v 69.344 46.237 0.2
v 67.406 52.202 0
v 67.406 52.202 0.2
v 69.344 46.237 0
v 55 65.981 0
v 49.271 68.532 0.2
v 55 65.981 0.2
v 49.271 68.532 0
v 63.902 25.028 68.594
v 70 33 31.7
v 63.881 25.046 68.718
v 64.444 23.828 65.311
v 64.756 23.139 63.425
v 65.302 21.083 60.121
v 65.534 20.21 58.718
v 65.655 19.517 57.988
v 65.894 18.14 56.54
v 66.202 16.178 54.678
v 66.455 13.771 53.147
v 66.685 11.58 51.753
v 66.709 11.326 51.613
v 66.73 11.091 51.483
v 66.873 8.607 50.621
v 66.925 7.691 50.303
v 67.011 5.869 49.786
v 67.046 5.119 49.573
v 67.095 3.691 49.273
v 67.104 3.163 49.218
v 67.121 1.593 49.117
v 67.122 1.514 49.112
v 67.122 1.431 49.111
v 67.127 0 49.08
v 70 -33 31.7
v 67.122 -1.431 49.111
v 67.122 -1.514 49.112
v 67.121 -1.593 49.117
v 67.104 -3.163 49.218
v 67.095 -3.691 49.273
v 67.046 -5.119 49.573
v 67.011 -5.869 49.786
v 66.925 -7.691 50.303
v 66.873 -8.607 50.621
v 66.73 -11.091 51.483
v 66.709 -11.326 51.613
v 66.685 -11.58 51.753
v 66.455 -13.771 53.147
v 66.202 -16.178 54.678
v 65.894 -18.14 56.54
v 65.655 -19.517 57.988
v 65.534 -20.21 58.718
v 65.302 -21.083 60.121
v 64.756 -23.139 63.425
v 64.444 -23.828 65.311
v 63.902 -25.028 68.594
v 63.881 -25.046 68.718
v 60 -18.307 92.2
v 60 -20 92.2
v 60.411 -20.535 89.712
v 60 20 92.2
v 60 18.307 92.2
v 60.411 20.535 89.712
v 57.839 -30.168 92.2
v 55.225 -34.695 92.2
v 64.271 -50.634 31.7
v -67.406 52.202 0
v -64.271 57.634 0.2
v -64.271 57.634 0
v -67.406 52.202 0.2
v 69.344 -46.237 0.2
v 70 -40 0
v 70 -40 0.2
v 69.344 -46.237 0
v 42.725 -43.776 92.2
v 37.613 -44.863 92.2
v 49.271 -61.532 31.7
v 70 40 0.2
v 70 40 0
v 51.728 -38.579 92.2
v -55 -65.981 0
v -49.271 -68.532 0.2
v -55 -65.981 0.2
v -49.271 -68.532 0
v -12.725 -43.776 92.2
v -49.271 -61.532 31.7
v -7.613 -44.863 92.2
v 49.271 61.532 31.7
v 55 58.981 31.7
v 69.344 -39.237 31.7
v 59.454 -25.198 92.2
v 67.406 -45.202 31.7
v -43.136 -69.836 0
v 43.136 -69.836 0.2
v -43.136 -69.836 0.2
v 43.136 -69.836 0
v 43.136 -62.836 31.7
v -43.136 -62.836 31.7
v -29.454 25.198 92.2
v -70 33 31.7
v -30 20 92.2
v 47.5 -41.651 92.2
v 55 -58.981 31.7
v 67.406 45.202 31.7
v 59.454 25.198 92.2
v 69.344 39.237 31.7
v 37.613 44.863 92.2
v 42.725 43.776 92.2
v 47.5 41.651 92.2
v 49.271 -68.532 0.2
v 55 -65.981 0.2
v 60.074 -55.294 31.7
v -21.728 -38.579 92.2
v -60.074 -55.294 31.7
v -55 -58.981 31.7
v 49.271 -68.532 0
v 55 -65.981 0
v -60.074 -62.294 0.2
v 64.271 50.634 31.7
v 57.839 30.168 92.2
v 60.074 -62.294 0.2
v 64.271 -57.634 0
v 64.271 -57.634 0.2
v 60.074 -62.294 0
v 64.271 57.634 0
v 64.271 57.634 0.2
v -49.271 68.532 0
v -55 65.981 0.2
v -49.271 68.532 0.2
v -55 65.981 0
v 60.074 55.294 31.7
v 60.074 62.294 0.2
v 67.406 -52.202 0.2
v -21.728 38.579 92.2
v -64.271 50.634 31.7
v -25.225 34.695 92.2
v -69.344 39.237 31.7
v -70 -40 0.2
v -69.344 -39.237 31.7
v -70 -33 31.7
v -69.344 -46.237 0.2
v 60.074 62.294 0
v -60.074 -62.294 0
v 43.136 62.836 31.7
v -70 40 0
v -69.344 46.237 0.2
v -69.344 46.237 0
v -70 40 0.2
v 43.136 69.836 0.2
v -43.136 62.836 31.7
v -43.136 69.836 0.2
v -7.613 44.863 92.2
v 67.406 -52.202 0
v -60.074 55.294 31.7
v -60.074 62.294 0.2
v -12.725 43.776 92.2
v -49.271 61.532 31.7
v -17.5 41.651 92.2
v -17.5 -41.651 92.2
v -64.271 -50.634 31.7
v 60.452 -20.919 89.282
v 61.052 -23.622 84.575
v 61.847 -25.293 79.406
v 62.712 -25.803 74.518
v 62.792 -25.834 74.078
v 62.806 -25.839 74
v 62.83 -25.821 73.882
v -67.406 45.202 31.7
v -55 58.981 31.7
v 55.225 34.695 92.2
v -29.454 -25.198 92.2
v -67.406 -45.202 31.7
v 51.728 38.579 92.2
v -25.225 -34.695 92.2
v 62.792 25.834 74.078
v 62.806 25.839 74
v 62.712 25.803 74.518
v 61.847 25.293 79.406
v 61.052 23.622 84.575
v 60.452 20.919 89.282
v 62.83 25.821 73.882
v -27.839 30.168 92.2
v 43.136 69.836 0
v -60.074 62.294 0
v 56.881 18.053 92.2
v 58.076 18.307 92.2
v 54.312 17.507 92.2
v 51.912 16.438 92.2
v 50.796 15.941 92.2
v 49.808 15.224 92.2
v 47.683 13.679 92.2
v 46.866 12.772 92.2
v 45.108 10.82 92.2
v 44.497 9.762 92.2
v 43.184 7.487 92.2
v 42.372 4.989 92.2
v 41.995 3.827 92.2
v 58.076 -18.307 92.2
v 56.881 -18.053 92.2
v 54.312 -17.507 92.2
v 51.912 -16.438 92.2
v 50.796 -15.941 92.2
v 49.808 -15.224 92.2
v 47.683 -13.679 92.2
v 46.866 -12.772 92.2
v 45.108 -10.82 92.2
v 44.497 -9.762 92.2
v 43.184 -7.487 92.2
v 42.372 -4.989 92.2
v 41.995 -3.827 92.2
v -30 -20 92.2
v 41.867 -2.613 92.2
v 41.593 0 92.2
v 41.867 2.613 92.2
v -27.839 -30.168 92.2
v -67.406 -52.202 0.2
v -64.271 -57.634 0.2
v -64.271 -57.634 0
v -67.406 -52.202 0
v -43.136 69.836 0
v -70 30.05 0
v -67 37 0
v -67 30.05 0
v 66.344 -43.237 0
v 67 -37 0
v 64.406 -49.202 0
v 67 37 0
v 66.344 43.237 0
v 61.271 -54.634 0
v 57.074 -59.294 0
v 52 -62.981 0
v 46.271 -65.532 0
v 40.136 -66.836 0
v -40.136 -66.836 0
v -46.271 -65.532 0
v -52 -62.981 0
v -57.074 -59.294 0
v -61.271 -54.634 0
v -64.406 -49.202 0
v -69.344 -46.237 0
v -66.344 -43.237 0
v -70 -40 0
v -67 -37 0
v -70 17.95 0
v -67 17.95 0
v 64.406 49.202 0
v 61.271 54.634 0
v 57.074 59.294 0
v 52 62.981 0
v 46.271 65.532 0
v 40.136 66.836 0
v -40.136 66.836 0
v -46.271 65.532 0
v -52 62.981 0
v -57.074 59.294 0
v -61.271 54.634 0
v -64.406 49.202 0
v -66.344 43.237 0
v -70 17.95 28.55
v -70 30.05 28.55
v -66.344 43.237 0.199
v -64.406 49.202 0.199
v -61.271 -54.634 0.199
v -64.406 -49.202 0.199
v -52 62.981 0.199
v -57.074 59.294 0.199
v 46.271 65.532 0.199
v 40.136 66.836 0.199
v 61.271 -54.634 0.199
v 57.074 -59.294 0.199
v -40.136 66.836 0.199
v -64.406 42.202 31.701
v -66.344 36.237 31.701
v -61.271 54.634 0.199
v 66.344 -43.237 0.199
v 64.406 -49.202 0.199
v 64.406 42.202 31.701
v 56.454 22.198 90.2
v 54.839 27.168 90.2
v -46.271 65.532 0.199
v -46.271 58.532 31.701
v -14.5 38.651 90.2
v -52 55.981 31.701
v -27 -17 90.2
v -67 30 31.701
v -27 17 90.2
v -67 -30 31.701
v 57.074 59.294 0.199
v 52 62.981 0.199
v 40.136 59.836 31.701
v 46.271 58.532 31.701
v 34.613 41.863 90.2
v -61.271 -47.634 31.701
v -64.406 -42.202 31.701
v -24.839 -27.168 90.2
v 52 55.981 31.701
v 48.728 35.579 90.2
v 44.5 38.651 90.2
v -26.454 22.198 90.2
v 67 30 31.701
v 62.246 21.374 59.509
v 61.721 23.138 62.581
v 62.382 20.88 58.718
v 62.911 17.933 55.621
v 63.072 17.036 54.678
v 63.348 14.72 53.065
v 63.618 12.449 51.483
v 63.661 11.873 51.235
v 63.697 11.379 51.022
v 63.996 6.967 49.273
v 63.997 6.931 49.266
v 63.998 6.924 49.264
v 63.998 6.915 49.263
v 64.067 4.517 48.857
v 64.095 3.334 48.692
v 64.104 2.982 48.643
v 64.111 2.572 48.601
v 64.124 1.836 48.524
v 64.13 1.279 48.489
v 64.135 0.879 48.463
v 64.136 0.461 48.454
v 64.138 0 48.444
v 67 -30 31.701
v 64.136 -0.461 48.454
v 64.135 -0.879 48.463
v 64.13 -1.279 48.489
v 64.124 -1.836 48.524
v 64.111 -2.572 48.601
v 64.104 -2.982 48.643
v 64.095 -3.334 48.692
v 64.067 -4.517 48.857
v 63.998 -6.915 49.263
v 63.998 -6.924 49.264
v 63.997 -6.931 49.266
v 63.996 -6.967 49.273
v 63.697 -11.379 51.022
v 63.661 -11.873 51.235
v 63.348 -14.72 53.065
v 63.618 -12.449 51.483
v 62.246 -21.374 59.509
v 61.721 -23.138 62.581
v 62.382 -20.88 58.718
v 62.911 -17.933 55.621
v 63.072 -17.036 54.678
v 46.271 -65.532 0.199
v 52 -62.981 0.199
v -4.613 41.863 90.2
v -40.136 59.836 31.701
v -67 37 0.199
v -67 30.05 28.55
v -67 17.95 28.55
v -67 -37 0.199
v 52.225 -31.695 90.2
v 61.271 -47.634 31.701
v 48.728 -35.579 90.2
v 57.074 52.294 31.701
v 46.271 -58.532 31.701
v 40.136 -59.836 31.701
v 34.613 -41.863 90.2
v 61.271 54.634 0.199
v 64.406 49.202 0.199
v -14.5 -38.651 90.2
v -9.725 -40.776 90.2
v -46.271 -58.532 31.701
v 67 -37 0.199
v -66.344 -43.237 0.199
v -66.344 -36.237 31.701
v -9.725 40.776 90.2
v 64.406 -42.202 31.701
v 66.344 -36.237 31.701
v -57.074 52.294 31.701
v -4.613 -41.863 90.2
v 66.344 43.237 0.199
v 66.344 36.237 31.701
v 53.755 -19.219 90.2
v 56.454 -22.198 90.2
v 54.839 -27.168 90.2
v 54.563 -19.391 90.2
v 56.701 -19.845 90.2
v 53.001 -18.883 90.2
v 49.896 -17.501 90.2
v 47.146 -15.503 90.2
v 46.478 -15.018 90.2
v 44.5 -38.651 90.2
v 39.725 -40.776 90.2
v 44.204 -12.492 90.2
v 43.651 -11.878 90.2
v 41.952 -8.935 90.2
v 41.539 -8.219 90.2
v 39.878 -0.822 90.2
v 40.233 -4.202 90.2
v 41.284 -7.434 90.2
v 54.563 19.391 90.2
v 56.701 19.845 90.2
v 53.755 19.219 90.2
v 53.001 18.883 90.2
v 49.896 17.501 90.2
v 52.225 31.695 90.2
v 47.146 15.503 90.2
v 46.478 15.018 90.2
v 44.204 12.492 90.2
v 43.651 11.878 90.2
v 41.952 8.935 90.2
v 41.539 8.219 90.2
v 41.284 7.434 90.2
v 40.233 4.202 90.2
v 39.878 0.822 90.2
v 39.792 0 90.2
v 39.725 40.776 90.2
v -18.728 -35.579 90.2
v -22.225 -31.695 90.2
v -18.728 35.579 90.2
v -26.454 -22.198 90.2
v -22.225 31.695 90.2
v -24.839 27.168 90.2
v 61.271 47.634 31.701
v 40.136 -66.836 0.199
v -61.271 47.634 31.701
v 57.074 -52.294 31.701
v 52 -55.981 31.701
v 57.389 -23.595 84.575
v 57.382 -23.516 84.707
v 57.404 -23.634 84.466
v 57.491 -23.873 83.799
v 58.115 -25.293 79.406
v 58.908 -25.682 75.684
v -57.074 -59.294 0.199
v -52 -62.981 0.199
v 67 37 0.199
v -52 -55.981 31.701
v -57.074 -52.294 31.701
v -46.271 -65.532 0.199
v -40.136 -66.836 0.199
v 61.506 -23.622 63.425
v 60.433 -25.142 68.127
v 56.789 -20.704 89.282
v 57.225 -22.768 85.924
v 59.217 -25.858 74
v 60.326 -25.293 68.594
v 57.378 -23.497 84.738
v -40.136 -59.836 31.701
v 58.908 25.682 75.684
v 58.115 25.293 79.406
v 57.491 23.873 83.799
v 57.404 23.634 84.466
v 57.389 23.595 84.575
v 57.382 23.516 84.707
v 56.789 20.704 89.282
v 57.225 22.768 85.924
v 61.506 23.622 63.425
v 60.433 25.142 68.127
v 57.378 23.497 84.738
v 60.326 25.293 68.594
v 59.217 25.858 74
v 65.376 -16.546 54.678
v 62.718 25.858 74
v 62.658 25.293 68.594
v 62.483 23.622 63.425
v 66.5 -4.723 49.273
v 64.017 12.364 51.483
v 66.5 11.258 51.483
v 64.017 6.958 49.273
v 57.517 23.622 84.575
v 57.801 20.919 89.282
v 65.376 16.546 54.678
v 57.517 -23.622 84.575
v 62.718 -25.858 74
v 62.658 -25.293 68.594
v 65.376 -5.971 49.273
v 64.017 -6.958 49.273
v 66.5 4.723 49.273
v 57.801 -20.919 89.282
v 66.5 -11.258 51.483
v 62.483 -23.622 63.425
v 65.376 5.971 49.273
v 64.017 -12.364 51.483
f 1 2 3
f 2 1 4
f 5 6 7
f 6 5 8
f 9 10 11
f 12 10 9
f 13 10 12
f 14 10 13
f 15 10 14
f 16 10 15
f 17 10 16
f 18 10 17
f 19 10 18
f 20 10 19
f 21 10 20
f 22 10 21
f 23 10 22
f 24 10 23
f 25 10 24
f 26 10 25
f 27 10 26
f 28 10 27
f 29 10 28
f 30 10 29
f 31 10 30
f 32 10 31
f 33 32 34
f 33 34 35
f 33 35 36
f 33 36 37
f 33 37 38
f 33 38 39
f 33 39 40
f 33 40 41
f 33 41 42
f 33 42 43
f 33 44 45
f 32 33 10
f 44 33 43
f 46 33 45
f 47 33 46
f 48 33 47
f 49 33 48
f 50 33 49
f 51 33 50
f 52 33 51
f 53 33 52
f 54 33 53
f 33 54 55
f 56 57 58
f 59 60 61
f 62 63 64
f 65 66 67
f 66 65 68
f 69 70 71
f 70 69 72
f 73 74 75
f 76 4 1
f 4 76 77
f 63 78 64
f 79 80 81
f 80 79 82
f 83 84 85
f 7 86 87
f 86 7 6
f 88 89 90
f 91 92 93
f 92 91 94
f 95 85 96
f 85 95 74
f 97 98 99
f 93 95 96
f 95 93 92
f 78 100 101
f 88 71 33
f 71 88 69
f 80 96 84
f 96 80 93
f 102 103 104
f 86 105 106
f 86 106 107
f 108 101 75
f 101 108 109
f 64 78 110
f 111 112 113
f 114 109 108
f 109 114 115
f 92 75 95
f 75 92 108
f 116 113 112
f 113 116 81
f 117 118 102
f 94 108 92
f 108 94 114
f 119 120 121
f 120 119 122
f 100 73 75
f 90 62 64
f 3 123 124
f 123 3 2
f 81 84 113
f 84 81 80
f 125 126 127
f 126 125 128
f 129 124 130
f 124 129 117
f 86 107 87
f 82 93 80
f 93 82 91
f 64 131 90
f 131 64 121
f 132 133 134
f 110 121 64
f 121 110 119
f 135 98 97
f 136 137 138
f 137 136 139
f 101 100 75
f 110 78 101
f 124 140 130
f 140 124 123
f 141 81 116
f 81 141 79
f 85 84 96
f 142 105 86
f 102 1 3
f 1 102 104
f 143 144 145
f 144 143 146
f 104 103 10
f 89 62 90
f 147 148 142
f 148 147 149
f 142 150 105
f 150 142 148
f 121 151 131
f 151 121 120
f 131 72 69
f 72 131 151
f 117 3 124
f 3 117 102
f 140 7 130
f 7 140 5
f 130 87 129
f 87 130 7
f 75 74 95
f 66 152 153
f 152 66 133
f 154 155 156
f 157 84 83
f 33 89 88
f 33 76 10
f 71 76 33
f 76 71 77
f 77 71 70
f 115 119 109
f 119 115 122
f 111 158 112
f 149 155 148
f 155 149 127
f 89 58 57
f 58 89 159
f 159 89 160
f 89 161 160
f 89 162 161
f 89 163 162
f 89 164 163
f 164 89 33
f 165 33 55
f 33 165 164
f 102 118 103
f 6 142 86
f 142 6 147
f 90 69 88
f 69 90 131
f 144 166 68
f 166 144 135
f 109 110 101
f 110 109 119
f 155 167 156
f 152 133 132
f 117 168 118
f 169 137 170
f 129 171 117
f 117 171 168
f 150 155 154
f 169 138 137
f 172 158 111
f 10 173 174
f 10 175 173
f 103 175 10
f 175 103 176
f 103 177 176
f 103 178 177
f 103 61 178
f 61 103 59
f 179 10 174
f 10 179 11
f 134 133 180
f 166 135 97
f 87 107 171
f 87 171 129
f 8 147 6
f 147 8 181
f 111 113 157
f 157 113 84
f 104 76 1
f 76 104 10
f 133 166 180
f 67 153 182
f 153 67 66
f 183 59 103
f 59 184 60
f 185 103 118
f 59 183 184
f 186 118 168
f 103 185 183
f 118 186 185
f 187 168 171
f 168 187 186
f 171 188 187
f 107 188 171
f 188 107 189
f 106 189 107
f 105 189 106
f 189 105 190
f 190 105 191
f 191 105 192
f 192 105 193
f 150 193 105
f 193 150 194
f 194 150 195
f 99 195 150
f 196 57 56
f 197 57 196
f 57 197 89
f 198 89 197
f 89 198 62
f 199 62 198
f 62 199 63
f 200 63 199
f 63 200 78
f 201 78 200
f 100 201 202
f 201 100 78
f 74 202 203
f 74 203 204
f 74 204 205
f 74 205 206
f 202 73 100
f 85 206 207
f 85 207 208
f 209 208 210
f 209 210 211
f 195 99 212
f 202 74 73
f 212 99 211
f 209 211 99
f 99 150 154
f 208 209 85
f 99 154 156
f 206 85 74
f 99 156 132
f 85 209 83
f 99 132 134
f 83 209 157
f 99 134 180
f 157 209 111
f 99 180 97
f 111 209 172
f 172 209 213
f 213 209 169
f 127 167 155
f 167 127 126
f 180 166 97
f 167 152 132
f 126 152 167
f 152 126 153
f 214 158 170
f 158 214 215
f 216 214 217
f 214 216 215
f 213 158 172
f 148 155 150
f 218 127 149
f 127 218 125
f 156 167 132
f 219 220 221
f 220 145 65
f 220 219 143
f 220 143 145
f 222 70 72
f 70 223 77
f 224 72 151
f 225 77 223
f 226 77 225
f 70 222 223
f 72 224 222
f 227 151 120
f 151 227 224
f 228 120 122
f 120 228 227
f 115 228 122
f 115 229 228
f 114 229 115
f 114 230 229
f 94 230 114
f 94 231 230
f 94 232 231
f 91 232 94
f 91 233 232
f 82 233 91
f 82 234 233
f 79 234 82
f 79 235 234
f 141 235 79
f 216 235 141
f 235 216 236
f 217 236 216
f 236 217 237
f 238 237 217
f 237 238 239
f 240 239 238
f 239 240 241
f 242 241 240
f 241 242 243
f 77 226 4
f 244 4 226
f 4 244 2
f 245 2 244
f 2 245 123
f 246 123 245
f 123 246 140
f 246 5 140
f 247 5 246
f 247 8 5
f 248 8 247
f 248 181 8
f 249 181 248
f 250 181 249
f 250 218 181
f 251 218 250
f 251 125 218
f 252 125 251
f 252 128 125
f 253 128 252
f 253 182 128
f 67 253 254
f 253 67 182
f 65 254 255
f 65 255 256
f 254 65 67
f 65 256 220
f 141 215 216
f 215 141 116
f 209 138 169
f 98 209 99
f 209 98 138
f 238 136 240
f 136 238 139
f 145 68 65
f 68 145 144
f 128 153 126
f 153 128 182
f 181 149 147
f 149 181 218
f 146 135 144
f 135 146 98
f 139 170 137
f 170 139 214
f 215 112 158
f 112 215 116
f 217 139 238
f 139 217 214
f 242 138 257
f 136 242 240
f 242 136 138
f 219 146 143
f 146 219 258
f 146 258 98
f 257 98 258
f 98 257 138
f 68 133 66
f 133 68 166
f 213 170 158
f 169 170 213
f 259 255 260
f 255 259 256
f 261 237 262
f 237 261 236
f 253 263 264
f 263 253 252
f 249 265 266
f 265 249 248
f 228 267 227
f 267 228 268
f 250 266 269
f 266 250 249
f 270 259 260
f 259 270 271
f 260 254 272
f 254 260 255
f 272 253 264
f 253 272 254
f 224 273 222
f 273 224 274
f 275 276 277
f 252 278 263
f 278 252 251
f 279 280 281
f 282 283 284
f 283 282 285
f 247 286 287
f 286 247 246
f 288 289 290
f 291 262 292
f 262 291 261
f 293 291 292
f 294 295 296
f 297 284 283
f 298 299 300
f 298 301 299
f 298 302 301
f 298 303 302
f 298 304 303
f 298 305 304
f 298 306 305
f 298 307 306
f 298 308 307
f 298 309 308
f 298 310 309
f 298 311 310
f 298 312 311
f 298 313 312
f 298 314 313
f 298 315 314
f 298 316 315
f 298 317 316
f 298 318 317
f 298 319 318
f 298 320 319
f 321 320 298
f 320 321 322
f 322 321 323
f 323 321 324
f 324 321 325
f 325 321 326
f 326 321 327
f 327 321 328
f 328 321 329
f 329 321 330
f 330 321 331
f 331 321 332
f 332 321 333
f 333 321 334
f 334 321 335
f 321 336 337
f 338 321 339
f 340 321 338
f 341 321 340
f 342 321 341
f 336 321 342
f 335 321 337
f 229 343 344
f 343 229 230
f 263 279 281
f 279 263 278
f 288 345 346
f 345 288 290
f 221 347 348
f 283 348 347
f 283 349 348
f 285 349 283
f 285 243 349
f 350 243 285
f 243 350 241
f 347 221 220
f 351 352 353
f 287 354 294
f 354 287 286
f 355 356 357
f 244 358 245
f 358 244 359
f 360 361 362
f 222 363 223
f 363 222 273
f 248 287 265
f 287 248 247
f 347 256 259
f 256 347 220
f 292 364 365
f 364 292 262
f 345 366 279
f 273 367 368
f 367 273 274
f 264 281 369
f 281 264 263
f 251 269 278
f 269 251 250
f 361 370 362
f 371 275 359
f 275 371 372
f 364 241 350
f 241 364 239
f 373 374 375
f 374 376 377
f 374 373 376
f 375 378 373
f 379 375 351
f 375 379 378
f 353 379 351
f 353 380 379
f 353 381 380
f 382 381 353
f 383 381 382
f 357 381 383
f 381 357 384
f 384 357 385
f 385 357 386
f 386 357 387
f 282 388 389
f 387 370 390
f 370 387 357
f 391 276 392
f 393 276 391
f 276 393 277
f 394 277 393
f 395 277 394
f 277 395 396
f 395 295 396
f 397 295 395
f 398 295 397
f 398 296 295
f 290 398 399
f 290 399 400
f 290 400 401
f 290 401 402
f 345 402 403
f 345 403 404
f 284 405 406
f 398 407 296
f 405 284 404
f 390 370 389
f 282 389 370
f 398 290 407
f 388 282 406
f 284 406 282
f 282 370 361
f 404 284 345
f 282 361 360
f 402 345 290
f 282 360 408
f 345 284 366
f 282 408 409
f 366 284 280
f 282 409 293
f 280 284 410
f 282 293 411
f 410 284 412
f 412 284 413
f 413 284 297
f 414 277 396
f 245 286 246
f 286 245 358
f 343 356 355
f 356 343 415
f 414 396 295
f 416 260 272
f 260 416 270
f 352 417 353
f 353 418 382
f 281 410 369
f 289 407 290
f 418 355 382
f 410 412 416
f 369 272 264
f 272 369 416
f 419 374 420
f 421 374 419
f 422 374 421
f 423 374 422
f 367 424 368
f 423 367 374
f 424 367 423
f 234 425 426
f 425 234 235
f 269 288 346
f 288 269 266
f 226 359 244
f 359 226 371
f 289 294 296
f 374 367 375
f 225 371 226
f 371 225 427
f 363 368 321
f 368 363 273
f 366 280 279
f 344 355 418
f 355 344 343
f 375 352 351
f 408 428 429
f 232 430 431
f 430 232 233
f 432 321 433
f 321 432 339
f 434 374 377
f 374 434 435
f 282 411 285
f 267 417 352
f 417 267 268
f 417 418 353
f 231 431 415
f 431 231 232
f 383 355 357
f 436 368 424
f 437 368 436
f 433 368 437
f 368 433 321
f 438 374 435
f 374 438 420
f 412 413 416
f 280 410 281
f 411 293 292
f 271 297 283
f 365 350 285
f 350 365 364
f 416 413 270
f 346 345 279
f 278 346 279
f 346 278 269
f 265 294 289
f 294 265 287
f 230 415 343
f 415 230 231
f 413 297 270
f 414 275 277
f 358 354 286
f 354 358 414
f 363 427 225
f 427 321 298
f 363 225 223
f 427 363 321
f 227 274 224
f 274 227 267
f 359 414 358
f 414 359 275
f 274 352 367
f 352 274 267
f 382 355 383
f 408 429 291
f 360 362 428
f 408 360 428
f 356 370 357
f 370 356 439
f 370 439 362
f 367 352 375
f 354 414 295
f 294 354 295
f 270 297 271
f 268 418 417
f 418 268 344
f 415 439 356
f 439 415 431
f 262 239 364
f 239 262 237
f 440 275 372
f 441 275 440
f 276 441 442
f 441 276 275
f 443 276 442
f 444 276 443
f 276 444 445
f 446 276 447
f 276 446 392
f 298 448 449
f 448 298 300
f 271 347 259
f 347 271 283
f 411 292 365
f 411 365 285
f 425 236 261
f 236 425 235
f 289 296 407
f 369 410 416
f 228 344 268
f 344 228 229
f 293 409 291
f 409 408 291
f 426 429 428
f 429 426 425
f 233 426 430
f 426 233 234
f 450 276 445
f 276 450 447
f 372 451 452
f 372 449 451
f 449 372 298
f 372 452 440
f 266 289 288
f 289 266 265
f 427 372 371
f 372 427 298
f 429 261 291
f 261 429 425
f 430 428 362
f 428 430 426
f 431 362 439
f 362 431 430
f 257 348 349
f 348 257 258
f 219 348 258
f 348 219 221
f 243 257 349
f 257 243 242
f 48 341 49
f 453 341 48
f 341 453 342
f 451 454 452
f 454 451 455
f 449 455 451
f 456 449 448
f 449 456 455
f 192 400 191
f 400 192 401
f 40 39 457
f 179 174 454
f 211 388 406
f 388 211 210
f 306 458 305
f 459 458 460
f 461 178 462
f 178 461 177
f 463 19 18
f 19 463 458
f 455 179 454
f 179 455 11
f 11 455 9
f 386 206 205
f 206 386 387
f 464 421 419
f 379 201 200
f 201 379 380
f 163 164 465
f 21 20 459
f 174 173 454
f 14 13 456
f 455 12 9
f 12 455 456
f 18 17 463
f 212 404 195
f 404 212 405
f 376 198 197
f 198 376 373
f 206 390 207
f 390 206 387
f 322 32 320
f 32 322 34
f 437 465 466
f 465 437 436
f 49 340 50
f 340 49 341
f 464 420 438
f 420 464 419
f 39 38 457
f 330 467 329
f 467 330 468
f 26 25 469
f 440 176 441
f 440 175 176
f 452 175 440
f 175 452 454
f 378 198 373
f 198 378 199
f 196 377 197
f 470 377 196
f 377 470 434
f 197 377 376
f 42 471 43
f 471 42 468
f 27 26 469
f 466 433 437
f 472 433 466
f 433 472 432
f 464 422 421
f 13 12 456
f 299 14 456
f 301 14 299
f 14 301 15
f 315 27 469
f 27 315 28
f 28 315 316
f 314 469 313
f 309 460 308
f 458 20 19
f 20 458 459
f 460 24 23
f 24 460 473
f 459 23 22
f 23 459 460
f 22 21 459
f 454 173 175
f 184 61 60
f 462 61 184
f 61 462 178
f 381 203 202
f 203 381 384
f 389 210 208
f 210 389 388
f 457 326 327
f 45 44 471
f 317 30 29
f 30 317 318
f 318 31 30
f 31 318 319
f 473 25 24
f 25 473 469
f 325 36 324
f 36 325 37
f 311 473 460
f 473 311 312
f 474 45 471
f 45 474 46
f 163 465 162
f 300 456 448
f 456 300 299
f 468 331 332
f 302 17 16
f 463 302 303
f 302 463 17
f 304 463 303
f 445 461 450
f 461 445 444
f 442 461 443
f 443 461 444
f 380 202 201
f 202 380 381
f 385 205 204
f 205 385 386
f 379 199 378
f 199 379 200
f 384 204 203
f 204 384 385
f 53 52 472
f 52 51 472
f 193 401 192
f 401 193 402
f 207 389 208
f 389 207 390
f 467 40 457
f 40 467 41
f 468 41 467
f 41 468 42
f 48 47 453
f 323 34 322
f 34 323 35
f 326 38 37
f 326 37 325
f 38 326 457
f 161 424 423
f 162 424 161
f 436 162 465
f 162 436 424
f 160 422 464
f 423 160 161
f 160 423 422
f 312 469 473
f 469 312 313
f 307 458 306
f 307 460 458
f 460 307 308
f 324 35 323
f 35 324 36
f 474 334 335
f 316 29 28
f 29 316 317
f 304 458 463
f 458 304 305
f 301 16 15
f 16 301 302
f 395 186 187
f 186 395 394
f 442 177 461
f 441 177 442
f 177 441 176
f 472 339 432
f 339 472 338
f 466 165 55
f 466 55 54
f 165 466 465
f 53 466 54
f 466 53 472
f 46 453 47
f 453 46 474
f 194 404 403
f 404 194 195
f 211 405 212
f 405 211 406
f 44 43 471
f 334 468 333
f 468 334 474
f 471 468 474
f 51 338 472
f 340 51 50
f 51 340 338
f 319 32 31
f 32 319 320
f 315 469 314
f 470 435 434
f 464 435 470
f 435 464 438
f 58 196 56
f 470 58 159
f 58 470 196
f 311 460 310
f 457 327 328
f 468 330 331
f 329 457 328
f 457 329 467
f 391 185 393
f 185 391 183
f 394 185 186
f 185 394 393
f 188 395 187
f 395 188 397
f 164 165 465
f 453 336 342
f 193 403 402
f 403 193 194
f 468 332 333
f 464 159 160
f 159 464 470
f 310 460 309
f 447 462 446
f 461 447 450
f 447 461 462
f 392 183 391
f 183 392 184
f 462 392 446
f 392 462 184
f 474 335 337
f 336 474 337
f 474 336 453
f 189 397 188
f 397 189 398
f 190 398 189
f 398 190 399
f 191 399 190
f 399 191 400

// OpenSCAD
$fs=0.5;
module rounded_square_corners(x,y,r){
    x_offset = x/2-r;
    y_offset = y/2-r;
    translate([x_offset,y_offset,0])
    cylinder(r=r,h=0.2);
    translate([-x_offset,y_offset,0])
    cylinder(r=r,h=0.2);
    translate([x_offset,-y_offset,0])
    cylinder(r=r,h=0.2);
    translate([-x_offset,-y_offset,0])
    cylinder(r=r,h=0.2);
}

module cover() {
    difference() {
        hull(){
            rounded_square_corners(140,140,30);
            translate([0,0,31.5])
            rounded_square_corners(140,126,30); 
           
            translate([15,0,92])
            rounded_square_corners(90,90,25); 
            
        }

        hull(){
            translate([0,0,-0.001])
            rounded_square_corners(134,134,30);
            translate([0,0,31.501])
            rounded_square_corners(134,120,30); 
           
            translate([15,0,90])
            rounded_square_corners(84,84,25);  
        }
        translate([-64,24,13.5])
            cube([12.1,12.1,30.1], center=true);
        
        translate([60,0,74])
        sphere(r=26);
    }
}

cover();
